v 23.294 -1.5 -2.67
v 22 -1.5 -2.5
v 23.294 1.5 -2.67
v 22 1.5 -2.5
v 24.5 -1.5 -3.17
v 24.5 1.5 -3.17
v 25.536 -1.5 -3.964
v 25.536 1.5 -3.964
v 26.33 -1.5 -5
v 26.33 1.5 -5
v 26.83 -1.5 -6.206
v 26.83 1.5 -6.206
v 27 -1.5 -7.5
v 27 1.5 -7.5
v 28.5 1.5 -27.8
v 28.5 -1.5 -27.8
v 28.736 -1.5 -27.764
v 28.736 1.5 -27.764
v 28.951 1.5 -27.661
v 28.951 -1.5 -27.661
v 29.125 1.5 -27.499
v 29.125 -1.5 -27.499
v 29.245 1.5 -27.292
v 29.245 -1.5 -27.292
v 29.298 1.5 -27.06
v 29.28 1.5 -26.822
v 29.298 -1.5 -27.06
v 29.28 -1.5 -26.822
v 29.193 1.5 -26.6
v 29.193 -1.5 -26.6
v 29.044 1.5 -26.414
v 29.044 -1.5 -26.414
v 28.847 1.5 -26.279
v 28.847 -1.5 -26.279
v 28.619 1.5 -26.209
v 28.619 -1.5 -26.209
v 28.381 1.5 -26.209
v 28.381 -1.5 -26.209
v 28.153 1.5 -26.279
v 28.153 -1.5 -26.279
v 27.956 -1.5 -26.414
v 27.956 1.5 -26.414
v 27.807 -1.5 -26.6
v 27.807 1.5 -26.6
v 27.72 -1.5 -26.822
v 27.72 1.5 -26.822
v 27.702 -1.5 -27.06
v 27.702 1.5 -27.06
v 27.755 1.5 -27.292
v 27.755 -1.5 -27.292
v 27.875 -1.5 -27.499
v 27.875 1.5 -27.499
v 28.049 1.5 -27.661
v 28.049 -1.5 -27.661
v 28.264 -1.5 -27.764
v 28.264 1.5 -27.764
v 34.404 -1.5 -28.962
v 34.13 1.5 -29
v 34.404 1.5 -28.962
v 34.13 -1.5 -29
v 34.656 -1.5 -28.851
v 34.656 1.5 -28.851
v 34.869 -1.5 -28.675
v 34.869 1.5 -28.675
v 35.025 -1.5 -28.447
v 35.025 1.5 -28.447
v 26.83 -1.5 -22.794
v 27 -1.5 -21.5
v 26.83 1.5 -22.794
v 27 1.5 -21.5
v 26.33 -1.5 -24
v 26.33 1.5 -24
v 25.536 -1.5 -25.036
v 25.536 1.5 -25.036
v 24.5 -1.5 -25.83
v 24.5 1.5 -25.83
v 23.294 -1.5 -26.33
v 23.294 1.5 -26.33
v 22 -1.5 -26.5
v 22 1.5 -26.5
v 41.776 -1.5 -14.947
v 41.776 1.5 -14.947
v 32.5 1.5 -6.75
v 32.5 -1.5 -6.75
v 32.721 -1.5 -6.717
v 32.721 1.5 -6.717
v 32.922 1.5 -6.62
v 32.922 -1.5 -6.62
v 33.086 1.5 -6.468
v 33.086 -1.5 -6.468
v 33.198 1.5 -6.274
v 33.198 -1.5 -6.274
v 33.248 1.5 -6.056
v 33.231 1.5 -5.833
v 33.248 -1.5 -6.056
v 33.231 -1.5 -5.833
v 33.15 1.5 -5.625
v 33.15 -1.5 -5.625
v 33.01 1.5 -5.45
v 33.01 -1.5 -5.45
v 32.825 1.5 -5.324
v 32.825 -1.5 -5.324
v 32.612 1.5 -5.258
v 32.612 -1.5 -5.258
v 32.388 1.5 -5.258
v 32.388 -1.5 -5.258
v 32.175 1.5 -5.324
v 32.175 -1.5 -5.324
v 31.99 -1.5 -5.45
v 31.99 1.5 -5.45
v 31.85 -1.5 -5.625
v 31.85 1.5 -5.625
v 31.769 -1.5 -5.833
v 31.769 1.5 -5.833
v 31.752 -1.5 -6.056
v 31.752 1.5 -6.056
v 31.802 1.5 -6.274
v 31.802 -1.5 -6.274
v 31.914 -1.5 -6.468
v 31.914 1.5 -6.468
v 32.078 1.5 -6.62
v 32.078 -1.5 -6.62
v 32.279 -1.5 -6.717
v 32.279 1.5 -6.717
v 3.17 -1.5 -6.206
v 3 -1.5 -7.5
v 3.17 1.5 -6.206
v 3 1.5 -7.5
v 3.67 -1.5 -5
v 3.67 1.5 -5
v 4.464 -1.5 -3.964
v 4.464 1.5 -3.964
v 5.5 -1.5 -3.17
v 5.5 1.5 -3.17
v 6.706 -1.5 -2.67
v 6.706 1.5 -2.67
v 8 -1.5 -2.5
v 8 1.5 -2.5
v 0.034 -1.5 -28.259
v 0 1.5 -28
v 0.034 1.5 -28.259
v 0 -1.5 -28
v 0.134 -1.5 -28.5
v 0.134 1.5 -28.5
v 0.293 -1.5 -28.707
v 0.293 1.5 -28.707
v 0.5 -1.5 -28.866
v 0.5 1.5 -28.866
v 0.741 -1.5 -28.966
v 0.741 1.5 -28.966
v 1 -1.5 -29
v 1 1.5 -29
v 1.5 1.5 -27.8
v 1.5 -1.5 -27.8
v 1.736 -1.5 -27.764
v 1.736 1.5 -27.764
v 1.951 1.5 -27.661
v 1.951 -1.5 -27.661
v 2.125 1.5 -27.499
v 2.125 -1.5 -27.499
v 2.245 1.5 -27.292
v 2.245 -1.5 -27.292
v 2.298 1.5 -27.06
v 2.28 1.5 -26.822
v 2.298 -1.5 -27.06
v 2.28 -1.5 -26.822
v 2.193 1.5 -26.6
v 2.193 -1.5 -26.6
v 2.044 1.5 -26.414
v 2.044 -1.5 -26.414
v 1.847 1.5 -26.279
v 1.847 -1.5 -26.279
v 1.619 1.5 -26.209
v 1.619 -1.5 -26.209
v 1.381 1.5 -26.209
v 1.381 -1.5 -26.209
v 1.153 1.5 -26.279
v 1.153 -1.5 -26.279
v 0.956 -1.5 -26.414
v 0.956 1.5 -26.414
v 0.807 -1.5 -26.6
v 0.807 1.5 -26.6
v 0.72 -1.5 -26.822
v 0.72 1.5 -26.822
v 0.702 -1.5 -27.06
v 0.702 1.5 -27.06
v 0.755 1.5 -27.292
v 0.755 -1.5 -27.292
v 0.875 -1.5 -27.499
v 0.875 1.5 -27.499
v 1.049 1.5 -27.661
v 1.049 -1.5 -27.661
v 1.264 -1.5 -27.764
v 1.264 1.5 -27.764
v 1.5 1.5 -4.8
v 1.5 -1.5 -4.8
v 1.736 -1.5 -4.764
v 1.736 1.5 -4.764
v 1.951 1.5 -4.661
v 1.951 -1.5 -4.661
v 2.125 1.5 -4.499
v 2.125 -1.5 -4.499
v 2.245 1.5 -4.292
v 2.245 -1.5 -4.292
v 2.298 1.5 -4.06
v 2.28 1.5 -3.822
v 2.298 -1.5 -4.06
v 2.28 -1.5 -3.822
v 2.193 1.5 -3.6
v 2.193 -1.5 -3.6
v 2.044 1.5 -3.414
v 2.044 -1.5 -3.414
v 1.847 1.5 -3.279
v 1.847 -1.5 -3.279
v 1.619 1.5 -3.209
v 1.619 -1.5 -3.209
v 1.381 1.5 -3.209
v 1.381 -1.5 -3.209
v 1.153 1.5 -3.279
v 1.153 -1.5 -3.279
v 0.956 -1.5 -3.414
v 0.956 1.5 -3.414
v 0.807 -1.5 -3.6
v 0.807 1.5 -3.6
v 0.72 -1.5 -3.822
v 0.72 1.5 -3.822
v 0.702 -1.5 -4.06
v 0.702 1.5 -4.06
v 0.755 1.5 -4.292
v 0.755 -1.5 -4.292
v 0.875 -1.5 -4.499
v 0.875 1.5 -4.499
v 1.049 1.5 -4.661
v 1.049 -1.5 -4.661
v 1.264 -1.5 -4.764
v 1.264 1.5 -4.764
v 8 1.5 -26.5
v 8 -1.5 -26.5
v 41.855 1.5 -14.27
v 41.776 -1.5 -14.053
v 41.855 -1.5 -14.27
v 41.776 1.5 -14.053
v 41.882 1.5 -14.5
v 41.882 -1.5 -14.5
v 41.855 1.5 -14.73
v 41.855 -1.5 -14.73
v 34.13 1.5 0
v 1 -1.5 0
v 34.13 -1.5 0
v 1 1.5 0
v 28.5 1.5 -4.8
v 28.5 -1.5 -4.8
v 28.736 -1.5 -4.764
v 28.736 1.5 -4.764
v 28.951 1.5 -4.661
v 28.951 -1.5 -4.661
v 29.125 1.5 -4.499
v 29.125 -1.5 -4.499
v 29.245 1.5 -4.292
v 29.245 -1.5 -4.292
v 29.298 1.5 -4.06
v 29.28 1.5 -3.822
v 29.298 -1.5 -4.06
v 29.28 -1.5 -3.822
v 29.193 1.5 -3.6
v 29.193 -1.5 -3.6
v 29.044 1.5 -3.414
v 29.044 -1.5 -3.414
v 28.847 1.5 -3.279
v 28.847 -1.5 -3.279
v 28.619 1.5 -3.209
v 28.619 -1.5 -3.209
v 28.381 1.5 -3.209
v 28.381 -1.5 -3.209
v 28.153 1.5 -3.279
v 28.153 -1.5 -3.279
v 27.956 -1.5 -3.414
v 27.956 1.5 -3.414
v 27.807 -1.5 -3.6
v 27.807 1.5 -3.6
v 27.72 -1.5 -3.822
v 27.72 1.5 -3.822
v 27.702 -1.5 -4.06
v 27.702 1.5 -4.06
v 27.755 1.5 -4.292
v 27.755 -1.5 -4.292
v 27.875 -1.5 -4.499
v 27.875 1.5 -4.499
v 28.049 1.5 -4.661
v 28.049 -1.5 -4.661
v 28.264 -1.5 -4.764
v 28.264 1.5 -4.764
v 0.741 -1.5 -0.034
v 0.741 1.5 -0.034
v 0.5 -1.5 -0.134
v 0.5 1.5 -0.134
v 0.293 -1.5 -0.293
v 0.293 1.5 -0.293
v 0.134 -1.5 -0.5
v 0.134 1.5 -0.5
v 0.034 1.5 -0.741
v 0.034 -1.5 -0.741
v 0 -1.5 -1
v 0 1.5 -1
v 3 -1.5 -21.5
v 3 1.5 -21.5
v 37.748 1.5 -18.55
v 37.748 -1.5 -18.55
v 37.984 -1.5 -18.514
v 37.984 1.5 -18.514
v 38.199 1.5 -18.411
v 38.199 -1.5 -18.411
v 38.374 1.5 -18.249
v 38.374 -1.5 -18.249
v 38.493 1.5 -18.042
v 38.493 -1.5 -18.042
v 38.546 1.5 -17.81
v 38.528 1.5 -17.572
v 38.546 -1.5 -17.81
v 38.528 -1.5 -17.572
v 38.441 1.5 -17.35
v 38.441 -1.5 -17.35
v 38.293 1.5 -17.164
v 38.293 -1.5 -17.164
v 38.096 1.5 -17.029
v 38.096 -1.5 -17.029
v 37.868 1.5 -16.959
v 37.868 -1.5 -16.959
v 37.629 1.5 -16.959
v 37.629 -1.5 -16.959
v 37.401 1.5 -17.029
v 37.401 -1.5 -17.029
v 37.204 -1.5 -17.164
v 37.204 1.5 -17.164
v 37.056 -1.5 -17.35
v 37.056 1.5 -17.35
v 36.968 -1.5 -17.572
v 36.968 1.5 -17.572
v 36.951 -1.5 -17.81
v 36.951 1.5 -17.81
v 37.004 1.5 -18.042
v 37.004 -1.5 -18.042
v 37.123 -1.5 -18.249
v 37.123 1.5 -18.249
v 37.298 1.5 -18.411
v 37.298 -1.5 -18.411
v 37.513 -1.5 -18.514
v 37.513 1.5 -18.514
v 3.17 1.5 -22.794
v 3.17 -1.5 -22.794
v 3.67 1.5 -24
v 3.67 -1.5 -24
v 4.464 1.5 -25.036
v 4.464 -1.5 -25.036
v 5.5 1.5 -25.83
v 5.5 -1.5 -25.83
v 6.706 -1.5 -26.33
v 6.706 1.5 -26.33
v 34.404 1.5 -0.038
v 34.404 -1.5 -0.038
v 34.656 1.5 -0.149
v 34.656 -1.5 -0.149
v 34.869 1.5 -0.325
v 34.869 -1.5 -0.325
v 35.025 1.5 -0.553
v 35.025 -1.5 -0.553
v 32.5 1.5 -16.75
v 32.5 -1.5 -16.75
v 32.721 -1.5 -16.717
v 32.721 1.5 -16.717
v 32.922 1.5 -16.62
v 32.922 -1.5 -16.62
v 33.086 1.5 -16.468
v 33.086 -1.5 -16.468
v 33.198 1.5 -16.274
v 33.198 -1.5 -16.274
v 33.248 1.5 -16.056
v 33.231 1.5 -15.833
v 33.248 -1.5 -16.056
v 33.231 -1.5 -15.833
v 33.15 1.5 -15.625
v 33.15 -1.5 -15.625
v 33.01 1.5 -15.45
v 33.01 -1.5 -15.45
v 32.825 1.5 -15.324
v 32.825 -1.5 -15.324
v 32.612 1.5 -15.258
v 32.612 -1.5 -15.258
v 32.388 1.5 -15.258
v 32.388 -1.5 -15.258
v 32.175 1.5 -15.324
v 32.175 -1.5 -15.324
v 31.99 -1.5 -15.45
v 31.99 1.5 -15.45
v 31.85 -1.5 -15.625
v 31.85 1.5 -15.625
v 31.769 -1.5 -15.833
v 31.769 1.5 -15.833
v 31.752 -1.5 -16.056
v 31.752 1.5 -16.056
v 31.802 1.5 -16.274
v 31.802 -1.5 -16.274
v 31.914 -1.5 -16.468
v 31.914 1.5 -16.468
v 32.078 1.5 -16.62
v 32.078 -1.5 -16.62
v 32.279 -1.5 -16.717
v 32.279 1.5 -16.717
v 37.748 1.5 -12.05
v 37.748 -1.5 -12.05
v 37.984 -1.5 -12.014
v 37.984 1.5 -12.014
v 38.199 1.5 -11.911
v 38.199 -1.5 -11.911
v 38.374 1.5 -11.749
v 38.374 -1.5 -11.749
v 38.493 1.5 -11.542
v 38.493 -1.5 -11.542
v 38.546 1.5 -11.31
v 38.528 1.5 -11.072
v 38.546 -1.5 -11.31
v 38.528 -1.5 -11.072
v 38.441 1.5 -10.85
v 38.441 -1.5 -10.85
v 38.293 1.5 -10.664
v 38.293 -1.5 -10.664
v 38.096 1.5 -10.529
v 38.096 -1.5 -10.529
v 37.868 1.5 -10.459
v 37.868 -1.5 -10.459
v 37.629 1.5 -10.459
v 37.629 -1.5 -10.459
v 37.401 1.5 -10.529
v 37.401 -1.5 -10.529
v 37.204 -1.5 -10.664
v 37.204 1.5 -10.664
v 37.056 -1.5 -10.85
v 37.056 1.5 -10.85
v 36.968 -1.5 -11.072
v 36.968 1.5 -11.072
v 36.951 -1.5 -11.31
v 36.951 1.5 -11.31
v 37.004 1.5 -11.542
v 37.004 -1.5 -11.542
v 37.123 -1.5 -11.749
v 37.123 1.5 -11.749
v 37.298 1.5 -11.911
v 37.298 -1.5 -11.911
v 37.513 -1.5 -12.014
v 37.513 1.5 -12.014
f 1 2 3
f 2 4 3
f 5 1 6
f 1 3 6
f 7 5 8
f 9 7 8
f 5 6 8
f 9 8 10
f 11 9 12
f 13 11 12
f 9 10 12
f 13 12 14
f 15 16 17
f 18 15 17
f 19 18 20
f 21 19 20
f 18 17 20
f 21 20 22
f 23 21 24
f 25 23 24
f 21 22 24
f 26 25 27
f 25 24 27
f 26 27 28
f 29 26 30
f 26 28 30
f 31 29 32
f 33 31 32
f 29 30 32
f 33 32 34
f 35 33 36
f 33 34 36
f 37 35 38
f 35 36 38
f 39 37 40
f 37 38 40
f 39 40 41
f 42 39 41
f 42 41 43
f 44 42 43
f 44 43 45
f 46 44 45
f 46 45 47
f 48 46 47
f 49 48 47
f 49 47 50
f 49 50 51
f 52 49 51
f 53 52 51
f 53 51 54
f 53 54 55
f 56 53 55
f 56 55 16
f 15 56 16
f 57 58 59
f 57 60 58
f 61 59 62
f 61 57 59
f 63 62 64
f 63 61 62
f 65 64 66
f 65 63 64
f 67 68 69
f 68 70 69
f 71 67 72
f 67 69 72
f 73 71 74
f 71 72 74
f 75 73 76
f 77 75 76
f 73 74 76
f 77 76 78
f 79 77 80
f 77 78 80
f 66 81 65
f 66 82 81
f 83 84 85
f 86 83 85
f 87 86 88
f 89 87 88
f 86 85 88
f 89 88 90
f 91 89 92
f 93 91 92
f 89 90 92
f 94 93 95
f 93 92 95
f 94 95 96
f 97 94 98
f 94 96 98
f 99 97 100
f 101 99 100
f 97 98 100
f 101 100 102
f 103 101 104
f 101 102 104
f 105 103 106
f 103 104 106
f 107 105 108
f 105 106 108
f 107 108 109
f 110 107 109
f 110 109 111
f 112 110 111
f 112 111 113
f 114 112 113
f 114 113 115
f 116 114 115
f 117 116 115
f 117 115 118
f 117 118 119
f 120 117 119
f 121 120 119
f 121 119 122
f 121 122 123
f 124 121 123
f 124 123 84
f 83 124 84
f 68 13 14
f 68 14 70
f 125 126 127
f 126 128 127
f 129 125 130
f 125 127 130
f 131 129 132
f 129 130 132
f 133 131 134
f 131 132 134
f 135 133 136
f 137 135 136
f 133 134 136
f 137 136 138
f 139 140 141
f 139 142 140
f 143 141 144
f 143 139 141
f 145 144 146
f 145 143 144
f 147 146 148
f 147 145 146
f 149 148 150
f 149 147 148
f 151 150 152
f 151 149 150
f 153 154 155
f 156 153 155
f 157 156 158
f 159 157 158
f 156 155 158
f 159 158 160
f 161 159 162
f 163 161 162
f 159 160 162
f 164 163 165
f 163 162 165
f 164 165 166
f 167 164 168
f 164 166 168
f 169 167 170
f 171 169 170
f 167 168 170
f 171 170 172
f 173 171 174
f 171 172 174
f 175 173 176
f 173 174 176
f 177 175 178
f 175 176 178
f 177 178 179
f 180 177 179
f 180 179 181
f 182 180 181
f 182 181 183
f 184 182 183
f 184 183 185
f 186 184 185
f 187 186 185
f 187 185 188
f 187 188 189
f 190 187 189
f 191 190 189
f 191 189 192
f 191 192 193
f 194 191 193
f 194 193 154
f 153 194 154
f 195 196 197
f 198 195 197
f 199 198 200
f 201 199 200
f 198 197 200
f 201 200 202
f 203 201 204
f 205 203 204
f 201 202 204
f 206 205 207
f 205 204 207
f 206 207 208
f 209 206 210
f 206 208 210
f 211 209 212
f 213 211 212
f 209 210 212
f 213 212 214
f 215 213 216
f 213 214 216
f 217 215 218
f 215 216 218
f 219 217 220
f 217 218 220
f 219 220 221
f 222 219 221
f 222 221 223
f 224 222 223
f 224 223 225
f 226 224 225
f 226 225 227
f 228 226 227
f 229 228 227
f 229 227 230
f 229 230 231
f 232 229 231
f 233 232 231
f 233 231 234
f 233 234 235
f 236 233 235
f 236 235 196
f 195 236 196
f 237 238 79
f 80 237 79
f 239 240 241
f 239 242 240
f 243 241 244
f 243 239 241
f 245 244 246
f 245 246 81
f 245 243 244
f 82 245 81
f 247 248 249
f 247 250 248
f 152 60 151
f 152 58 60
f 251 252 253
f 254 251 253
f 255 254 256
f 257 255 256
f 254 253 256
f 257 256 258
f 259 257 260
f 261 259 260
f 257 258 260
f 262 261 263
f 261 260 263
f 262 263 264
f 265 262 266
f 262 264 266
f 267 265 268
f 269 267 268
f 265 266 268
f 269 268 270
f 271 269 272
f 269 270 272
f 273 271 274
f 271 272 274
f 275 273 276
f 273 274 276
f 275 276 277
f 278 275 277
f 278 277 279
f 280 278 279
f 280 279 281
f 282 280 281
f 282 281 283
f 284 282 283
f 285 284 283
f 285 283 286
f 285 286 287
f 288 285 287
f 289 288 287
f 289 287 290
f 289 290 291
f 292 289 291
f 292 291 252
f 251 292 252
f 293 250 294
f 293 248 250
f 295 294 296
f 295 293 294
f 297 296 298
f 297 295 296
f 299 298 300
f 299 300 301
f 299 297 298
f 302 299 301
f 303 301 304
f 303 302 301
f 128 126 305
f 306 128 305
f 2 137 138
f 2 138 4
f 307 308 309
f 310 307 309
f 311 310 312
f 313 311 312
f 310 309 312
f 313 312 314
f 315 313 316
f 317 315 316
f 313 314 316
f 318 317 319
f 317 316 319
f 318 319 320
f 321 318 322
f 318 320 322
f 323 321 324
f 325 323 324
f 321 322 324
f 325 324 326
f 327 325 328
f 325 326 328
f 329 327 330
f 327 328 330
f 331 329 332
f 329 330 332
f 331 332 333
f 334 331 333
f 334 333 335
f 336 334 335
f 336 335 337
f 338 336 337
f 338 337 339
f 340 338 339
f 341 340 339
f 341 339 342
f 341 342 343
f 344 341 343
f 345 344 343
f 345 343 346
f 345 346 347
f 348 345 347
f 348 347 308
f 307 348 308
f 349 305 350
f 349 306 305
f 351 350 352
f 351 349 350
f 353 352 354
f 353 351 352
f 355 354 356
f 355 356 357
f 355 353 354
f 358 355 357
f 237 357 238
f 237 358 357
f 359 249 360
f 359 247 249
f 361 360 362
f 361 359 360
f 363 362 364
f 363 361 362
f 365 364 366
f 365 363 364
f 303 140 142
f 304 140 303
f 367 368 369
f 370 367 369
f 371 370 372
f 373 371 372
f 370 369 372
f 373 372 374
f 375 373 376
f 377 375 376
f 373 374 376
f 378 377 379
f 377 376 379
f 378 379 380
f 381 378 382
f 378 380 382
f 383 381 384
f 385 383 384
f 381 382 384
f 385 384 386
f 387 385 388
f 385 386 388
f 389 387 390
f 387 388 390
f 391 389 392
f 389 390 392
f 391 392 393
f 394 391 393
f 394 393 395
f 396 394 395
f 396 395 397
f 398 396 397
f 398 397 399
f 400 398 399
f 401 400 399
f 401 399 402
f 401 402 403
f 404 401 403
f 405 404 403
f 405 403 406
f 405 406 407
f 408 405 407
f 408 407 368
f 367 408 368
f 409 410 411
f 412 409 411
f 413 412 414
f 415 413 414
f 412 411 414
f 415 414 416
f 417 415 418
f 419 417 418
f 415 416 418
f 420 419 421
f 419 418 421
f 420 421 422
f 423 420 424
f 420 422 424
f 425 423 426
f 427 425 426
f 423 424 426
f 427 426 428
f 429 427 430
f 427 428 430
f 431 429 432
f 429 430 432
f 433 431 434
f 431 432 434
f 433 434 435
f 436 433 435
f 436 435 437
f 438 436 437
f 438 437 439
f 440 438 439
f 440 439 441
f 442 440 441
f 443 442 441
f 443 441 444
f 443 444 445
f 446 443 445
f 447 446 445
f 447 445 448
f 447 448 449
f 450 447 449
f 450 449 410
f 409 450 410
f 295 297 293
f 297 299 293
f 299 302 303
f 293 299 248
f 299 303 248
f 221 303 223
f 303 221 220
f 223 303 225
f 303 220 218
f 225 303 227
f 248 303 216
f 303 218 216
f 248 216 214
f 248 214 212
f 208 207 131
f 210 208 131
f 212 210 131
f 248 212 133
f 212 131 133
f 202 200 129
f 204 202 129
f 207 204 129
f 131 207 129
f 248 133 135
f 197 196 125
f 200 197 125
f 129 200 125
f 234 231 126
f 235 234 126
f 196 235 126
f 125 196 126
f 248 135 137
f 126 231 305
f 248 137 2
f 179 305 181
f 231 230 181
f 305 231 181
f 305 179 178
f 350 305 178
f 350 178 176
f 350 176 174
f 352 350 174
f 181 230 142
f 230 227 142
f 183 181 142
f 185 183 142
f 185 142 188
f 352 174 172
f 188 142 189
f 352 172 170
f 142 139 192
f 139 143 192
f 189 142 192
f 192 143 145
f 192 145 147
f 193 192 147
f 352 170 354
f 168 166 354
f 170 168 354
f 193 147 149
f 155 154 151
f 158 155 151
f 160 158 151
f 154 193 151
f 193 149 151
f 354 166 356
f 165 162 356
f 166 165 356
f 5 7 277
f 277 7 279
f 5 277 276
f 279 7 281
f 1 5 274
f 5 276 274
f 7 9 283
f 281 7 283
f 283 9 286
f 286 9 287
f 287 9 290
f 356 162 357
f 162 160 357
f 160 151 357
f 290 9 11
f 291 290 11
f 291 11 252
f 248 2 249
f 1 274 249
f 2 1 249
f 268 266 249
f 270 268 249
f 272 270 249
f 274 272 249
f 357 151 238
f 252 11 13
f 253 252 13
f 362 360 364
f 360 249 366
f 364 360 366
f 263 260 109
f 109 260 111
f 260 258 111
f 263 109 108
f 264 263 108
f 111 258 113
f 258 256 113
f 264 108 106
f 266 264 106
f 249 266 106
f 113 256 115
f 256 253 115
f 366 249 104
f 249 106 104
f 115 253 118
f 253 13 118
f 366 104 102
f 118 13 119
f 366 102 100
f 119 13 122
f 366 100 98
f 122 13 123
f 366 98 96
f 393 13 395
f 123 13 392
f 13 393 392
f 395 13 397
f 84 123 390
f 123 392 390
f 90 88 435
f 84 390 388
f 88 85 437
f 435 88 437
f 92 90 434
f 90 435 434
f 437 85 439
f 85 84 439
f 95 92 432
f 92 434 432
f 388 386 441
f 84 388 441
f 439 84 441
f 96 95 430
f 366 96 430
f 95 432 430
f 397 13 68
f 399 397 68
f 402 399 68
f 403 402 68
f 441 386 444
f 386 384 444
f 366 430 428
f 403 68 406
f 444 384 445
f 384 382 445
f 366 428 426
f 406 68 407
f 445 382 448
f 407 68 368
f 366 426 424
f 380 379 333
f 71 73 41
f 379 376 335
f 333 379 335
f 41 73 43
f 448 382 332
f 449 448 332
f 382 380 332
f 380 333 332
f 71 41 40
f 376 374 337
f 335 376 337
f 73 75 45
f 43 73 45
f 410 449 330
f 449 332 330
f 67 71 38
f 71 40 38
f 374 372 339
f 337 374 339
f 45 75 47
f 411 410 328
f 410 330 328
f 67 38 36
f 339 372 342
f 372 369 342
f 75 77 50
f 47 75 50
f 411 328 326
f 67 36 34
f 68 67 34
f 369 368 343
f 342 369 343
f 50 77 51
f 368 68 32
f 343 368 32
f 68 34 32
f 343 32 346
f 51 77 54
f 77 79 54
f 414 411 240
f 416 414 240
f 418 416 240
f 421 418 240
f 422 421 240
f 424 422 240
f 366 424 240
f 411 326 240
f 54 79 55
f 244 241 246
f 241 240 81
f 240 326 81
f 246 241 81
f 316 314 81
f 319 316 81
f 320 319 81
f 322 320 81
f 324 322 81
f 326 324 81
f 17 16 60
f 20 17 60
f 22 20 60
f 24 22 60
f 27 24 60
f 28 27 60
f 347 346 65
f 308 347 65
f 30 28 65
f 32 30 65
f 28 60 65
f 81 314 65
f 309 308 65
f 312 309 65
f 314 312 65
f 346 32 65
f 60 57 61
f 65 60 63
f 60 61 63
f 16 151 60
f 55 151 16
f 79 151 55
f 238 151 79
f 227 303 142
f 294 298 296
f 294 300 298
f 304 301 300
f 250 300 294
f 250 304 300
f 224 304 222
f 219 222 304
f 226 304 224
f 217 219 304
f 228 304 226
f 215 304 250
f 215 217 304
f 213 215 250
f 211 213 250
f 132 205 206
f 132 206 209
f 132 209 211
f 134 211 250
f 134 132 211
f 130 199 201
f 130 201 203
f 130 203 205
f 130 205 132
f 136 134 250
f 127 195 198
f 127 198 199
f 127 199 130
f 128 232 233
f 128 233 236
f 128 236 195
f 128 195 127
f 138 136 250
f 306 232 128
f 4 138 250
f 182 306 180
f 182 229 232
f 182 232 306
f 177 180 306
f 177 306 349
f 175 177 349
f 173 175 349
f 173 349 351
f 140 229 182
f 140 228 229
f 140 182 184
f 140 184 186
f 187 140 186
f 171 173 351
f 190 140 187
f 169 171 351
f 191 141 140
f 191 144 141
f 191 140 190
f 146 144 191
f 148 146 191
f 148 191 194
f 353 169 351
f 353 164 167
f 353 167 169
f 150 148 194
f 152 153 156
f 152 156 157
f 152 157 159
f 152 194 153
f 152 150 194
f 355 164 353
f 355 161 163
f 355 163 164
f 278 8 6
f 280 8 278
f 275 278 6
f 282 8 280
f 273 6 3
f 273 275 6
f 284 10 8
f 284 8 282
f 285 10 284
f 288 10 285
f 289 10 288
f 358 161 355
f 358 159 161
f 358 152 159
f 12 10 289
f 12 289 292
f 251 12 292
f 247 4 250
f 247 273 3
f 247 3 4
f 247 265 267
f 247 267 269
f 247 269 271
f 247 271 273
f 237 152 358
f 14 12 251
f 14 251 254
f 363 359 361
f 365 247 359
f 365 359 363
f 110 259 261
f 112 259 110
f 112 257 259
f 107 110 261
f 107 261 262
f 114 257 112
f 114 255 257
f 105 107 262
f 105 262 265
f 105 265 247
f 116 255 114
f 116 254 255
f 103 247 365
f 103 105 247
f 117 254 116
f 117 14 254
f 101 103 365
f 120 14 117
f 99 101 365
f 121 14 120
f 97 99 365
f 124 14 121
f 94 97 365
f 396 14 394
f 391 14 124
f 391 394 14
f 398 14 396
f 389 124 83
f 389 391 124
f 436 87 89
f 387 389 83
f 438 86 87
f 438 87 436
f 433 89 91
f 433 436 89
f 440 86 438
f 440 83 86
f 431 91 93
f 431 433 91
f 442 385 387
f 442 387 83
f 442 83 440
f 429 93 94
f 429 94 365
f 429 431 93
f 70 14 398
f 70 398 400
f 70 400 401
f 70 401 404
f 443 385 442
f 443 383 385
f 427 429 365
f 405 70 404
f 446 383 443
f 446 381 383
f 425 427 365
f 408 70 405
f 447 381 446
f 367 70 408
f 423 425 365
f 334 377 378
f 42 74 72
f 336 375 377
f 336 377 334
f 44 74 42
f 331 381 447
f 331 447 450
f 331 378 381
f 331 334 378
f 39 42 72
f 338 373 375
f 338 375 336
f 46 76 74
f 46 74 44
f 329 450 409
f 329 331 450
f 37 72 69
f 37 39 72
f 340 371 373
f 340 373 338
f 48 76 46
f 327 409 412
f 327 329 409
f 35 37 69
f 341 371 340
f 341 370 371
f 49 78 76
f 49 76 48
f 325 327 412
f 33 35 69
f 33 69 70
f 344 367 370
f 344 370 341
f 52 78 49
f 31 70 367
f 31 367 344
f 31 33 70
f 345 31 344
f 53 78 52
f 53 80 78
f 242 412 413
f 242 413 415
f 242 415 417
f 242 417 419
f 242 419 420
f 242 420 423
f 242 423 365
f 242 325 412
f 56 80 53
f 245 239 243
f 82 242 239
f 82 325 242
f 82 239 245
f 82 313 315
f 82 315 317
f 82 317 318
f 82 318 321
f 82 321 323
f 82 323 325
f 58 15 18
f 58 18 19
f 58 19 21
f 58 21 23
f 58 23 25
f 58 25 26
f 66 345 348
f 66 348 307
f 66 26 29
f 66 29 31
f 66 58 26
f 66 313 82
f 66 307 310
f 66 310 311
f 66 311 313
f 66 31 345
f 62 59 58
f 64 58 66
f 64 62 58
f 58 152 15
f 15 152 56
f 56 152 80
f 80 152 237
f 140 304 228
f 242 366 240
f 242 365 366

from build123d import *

# Parameters (mm, degrees)
BOSS_EXTRUDE1_DEPTH     = 1.5
CUT_EXTRUDE1_DEPTH      = 52.061237744
CUT_EXTRUDE1_DEPTH_BACK = 52.061237744
SKETCH2_W               = 24
SKETCH2_H               = 24
FILLET1_R               = 5
M2X0_4_TAPPED_HOLE1_D   = 1.6
F_1_5MM_DOWEL_HOLE1_D   = 1.5
FILLET2_R               = 1


with BuildPart() as part:
    # Sketch1 → Boss-Extrude1 (new, symmetric)
    with BuildSketch(Plane(origin=(0, 0, 0), x_dir=(1, 0, 0), z_dir=(0, 1, 0))):
        Polygon((0, 0), (34.748434417, 0), (42, 14.5), (34.748434417, 29), (0, 29), align=None)
    extrude(amount=BOSS_EXTRUDE1_DEPTH, both=True)

    # Sketch2 → Cut-Extrude1 (cut, two sides: drawn at the far end of the back side and taken through both)
    with BuildSketch(Plane(origin=(0, 0, 0), x_dir=(1, 0, 0), z_dir=(0, 1, 0)).offset(-CUT_EXTRUDE1_DEPTH_BACK)):
        with Locations((15, 14.5)):
            Rectangle(SKETCH2_W, SKETCH2_H)
    extrude(amount=CUT_EXTRUDE1_DEPTH + CUT_EXTRUDE1_DEPTH_BACK, mode=Mode.SUBTRACT)

    # Fillet1
    fillet1_edges = [part.edges().sort_by_distance(p)[0] for p in [
        (3, 0, -2.5),
        (3, 0, -26.5),
        (27, 0, -26.5),
        (27, 0, -2.5),
    ]]
    fillet(fillet1_edges, radius=FILLET1_R)

    # M2x0.4 Tapped Hole1 (through all)
    with Locations(Plane(origin=(1.5, 1.5, -27), x_dir=(0, 0, 1), z_dir=(0, 1, 0))):
        with Locations((0, 0), (0, 27), (9.25, 36.248434417), (15.75, 36.248434417), (23, 27), (23, 0)):
            Hole(M2X0_4_TAPPED_HOLE1_D / 2)

    # Ø1.5mm Dowel Hole1 (through all)
    with Locations(Plane(origin=(32.5, 1.5, -16), x_dir=(0, 0, 1), z_dir=(0, 1, 0))):
        with Locations((0, 0), (10, 0)):
            Hole(F_1_5MM_DOWEL_HOLE1_D / 2)

    # Fillet2
    fillet2_edges = [part.edges().sort_by_distance(p)[0] for p in [
        (0, 0, -29),
        (34.748434417, 0, -29),
        (42, 0, -14.5),
        (34.748434417, 0, 0),
        (0, 0, 0),
    ]]
    fillet(fillet2_edges, radius=FILLET2_R)


solid = part.part
